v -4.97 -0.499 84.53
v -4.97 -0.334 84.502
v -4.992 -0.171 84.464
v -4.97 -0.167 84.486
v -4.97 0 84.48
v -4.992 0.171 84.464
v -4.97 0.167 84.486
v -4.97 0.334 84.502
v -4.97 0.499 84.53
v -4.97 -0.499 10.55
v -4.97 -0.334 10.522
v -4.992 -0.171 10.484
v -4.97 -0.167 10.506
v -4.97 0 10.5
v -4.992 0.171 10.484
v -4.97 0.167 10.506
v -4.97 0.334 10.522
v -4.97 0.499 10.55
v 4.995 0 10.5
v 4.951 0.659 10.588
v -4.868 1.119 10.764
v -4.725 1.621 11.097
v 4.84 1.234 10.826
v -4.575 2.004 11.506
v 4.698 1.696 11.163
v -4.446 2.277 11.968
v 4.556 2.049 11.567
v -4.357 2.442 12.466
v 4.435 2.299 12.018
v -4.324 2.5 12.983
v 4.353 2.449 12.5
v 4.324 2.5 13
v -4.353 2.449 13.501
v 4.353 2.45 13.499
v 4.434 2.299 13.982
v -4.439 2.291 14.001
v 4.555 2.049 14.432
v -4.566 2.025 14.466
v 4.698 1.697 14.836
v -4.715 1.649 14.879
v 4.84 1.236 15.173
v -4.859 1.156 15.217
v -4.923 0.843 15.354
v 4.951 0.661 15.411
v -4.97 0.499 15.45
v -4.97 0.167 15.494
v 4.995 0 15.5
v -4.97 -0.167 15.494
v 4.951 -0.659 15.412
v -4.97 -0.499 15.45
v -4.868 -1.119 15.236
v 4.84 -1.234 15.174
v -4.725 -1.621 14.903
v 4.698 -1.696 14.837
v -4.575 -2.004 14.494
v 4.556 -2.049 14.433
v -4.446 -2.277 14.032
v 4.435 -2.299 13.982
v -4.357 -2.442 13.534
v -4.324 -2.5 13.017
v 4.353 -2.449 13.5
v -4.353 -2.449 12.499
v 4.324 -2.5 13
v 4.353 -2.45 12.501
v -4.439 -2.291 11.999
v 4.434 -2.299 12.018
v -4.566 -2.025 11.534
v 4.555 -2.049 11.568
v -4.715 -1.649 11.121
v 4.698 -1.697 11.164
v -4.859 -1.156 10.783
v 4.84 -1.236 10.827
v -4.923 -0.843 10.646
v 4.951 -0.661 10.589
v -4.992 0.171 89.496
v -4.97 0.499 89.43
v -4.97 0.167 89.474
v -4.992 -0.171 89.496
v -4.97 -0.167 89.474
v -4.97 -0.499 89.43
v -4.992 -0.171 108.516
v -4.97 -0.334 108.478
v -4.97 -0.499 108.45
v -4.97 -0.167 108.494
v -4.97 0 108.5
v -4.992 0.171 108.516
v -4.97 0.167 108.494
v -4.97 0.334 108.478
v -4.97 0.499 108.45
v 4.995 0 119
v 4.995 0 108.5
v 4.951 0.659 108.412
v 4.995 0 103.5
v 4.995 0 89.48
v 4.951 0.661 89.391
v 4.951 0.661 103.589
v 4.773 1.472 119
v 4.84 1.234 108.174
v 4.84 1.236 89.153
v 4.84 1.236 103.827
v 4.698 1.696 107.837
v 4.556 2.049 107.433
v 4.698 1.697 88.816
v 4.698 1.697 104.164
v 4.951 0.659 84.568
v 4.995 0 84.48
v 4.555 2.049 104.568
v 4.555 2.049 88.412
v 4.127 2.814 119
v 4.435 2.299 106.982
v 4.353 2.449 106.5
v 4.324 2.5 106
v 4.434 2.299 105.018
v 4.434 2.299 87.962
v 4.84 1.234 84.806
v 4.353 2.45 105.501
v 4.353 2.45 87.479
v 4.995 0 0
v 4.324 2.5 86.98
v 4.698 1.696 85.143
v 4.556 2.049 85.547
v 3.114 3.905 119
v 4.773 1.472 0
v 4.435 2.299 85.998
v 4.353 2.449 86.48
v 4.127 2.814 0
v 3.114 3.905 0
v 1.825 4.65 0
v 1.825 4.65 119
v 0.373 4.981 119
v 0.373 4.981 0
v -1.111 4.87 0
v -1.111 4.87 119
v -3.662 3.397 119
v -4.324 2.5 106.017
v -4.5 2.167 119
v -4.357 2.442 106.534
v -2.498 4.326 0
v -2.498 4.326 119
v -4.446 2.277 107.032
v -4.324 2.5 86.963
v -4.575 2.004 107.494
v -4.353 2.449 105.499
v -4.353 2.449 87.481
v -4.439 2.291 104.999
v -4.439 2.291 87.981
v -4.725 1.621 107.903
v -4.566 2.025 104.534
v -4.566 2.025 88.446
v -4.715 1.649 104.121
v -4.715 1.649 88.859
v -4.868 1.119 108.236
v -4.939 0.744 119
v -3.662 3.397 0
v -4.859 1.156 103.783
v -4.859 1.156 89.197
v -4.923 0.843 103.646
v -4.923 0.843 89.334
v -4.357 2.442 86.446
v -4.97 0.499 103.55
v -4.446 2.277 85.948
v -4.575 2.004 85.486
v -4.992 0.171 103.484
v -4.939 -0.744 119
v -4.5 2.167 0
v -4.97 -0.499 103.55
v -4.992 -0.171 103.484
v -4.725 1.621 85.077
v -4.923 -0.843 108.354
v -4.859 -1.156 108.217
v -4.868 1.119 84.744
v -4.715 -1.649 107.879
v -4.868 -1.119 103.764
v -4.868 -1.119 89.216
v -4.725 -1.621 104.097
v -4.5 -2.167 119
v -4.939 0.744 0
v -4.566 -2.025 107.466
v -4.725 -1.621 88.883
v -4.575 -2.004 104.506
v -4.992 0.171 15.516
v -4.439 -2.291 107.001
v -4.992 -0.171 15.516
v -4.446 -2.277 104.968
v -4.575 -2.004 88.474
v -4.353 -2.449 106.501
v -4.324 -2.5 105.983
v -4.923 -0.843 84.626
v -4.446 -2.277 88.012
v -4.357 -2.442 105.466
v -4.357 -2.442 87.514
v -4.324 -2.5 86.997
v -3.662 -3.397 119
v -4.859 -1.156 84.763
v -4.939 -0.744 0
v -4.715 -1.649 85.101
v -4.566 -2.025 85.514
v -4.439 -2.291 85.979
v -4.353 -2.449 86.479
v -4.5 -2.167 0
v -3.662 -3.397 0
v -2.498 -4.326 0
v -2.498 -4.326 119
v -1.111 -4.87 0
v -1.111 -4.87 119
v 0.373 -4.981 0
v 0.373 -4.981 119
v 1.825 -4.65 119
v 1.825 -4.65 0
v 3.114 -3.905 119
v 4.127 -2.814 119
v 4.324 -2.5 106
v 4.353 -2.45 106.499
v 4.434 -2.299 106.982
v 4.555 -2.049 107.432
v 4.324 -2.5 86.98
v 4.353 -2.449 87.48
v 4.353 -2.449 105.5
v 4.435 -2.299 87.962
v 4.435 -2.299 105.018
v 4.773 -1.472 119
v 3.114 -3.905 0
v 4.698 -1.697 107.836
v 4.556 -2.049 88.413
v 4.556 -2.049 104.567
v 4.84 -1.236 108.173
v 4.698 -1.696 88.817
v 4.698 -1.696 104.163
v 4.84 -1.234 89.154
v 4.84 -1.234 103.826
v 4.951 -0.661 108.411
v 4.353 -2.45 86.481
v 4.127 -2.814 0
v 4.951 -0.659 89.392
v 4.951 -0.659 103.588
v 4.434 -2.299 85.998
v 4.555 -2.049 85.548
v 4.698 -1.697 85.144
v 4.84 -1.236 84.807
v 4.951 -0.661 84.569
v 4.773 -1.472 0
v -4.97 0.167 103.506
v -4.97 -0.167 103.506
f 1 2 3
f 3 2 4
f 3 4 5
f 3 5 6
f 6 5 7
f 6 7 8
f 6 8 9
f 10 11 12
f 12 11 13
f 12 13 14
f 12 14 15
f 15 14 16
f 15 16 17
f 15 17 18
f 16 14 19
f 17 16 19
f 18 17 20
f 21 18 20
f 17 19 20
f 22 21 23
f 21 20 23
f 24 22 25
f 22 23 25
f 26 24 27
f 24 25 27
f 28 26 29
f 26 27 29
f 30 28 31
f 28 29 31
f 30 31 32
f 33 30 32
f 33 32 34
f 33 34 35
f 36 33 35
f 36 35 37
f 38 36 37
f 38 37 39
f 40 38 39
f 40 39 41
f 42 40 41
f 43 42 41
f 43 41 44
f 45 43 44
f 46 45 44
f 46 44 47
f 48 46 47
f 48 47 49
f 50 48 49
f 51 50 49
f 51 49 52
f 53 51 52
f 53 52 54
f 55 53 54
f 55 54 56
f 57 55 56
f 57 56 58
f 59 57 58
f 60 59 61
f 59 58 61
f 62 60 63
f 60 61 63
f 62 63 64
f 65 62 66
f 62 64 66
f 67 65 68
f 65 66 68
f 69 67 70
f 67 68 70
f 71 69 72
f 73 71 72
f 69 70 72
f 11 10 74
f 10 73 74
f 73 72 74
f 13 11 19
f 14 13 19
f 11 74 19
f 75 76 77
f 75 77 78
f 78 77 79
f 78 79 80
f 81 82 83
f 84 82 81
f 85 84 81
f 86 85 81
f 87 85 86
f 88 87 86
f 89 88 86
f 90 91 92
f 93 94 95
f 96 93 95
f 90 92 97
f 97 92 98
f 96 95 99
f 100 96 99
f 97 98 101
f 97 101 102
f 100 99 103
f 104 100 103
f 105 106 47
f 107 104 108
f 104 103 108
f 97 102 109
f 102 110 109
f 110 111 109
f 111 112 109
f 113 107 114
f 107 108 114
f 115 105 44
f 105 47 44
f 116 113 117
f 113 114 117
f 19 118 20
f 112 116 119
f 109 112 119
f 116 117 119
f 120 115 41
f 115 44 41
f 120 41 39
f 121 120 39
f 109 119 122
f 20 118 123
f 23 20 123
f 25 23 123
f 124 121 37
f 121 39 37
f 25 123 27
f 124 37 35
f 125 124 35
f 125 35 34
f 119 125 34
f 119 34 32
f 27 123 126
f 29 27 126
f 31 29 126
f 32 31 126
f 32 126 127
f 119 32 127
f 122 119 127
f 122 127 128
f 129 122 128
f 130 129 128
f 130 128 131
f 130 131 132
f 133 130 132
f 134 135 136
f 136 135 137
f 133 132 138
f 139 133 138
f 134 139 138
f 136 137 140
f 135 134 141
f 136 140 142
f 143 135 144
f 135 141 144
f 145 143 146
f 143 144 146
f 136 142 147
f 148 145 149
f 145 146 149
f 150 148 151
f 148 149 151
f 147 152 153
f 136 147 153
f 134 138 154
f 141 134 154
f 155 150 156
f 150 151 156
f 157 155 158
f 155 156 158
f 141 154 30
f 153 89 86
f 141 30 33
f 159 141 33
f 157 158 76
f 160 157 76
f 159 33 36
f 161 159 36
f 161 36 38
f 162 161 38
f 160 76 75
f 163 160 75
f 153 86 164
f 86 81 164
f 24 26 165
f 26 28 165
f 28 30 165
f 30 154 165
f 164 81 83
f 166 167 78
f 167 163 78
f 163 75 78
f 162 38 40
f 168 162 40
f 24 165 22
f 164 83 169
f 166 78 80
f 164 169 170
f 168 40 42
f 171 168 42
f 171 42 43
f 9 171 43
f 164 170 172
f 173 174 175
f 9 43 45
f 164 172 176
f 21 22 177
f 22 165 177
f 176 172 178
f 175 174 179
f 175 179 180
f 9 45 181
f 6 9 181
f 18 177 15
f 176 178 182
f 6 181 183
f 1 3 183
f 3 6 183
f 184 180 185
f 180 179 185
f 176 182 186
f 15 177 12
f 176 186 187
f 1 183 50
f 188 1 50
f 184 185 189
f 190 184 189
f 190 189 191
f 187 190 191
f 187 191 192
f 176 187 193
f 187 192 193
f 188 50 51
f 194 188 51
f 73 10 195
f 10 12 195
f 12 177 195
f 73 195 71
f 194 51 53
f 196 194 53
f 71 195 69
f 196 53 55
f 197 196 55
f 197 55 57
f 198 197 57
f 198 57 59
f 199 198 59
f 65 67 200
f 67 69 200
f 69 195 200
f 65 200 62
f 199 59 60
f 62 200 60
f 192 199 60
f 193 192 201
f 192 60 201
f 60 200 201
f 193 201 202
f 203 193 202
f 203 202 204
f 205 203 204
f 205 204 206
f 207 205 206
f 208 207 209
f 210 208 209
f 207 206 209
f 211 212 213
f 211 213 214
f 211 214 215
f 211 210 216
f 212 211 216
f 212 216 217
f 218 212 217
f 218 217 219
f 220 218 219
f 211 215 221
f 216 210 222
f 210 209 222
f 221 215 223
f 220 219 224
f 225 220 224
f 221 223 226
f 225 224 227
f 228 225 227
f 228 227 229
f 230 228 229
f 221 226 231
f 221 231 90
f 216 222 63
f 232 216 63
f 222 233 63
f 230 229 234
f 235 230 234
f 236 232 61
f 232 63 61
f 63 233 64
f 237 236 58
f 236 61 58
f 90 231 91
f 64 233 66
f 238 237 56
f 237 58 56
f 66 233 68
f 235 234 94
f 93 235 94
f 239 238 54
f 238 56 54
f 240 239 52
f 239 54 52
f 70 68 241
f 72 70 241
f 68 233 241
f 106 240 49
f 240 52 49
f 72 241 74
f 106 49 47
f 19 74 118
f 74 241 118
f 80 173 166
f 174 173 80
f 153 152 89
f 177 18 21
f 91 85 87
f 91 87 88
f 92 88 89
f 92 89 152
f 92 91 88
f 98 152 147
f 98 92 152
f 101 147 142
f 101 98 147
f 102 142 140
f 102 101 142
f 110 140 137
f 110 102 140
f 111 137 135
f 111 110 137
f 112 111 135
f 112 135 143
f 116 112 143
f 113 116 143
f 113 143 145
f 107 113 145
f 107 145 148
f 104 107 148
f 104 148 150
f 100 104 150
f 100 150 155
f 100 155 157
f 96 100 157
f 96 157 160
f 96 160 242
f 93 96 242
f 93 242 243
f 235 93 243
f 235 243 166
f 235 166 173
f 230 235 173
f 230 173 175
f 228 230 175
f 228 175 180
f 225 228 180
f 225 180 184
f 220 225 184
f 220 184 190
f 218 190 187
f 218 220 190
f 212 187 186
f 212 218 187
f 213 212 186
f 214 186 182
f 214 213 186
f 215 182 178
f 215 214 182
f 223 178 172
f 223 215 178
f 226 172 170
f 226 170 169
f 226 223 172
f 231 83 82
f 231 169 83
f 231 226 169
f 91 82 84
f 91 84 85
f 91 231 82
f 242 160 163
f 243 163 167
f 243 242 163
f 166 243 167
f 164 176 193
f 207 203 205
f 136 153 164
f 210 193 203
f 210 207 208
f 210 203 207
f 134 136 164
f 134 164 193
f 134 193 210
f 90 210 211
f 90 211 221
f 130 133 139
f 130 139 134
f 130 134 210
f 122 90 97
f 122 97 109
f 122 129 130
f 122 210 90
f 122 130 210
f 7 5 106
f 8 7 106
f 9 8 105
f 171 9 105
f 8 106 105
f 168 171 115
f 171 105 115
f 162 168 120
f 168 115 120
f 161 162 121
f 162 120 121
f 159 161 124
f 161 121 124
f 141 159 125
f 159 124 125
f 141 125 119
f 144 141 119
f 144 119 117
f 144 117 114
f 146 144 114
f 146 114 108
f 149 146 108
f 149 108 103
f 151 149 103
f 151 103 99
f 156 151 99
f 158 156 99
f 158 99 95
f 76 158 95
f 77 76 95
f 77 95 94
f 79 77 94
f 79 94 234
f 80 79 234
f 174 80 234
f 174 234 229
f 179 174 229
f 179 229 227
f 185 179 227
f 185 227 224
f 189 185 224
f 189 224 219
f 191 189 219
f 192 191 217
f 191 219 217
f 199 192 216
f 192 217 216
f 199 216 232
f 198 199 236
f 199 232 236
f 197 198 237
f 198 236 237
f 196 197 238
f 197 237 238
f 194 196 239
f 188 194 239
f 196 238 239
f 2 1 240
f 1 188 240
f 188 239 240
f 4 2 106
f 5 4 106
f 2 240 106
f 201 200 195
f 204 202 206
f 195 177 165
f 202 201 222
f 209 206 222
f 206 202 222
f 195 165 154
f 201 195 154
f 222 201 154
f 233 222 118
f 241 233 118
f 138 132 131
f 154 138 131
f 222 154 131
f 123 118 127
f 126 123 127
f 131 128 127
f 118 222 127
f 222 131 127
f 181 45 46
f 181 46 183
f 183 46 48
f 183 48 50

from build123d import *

# Parameters (mm, degrees)
SKETCH2_R                       = 4.995
BOSS_EXTRUDE1_DEPTH             = 119
F_5_0MM_DOWEL_HOLE1_D           = 5
F_5_0MM_DOWEL_HOLE1_CSINK_D     = 5.05
F_5_0MM_DOWEL_HOLE1_CSINK_ANGLE = 90
F_5_0MM_DOWEL_HOLE2_D           = 5
F_5_0MM_DOWEL_HOLE2_CSINK_D     = 5.05
F_5_0MM_DOWEL_HOLE2_CSINK_ANGLE = 90


with BuildPart() as part:
    # Sketch2 → Boss-Extrude1 (new body)
    with BuildSketch(Plane.XY):
        Circle(SKETCH2_R)
    extrude(amount=BOSS_EXTRUDE1_DEPTH)

    # Ø5.0mm Dowel Hole1 (through all)
    with Locations(Plane.ZY.offset(4.995)):
        with Locations((13, 0)):
            f_5_0mm_dowel_hole1 = CounterSinkHole(F_5_0MM_DOWEL_HOLE1_D / 2, F_5_0MM_DOWEL_HOLE1_CSINK_D / 2, counter_sink_angle=F_5_0MM_DOWEL_HOLE1_CSINK_ANGLE)

    # Mirror1: Ø5.0mm Dowel Hole1 across plane
    add(f_5_0mm_dowel_hole1.mirror(Plane(origin=(0, 0, 59.5), x_dir=(1, 0, 0), z_dir=(0, 0, -1))), mode=Mode.SUBTRACT)

    # Ø5.0mm Dowel Hole2 (through all)
    with Locations(Plane.ZY.offset(4.995)):
        with Locations((86.98, 0)):
            CounterSinkHole(F_5_0MM_DOWEL_HOLE2_D / 2, F_5_0MM_DOWEL_HOLE2_CSINK_D / 2, counter_sink_angle=F_5_0MM_DOWEL_HOLE2_CSINK_ANGLE)


solid = part.part
